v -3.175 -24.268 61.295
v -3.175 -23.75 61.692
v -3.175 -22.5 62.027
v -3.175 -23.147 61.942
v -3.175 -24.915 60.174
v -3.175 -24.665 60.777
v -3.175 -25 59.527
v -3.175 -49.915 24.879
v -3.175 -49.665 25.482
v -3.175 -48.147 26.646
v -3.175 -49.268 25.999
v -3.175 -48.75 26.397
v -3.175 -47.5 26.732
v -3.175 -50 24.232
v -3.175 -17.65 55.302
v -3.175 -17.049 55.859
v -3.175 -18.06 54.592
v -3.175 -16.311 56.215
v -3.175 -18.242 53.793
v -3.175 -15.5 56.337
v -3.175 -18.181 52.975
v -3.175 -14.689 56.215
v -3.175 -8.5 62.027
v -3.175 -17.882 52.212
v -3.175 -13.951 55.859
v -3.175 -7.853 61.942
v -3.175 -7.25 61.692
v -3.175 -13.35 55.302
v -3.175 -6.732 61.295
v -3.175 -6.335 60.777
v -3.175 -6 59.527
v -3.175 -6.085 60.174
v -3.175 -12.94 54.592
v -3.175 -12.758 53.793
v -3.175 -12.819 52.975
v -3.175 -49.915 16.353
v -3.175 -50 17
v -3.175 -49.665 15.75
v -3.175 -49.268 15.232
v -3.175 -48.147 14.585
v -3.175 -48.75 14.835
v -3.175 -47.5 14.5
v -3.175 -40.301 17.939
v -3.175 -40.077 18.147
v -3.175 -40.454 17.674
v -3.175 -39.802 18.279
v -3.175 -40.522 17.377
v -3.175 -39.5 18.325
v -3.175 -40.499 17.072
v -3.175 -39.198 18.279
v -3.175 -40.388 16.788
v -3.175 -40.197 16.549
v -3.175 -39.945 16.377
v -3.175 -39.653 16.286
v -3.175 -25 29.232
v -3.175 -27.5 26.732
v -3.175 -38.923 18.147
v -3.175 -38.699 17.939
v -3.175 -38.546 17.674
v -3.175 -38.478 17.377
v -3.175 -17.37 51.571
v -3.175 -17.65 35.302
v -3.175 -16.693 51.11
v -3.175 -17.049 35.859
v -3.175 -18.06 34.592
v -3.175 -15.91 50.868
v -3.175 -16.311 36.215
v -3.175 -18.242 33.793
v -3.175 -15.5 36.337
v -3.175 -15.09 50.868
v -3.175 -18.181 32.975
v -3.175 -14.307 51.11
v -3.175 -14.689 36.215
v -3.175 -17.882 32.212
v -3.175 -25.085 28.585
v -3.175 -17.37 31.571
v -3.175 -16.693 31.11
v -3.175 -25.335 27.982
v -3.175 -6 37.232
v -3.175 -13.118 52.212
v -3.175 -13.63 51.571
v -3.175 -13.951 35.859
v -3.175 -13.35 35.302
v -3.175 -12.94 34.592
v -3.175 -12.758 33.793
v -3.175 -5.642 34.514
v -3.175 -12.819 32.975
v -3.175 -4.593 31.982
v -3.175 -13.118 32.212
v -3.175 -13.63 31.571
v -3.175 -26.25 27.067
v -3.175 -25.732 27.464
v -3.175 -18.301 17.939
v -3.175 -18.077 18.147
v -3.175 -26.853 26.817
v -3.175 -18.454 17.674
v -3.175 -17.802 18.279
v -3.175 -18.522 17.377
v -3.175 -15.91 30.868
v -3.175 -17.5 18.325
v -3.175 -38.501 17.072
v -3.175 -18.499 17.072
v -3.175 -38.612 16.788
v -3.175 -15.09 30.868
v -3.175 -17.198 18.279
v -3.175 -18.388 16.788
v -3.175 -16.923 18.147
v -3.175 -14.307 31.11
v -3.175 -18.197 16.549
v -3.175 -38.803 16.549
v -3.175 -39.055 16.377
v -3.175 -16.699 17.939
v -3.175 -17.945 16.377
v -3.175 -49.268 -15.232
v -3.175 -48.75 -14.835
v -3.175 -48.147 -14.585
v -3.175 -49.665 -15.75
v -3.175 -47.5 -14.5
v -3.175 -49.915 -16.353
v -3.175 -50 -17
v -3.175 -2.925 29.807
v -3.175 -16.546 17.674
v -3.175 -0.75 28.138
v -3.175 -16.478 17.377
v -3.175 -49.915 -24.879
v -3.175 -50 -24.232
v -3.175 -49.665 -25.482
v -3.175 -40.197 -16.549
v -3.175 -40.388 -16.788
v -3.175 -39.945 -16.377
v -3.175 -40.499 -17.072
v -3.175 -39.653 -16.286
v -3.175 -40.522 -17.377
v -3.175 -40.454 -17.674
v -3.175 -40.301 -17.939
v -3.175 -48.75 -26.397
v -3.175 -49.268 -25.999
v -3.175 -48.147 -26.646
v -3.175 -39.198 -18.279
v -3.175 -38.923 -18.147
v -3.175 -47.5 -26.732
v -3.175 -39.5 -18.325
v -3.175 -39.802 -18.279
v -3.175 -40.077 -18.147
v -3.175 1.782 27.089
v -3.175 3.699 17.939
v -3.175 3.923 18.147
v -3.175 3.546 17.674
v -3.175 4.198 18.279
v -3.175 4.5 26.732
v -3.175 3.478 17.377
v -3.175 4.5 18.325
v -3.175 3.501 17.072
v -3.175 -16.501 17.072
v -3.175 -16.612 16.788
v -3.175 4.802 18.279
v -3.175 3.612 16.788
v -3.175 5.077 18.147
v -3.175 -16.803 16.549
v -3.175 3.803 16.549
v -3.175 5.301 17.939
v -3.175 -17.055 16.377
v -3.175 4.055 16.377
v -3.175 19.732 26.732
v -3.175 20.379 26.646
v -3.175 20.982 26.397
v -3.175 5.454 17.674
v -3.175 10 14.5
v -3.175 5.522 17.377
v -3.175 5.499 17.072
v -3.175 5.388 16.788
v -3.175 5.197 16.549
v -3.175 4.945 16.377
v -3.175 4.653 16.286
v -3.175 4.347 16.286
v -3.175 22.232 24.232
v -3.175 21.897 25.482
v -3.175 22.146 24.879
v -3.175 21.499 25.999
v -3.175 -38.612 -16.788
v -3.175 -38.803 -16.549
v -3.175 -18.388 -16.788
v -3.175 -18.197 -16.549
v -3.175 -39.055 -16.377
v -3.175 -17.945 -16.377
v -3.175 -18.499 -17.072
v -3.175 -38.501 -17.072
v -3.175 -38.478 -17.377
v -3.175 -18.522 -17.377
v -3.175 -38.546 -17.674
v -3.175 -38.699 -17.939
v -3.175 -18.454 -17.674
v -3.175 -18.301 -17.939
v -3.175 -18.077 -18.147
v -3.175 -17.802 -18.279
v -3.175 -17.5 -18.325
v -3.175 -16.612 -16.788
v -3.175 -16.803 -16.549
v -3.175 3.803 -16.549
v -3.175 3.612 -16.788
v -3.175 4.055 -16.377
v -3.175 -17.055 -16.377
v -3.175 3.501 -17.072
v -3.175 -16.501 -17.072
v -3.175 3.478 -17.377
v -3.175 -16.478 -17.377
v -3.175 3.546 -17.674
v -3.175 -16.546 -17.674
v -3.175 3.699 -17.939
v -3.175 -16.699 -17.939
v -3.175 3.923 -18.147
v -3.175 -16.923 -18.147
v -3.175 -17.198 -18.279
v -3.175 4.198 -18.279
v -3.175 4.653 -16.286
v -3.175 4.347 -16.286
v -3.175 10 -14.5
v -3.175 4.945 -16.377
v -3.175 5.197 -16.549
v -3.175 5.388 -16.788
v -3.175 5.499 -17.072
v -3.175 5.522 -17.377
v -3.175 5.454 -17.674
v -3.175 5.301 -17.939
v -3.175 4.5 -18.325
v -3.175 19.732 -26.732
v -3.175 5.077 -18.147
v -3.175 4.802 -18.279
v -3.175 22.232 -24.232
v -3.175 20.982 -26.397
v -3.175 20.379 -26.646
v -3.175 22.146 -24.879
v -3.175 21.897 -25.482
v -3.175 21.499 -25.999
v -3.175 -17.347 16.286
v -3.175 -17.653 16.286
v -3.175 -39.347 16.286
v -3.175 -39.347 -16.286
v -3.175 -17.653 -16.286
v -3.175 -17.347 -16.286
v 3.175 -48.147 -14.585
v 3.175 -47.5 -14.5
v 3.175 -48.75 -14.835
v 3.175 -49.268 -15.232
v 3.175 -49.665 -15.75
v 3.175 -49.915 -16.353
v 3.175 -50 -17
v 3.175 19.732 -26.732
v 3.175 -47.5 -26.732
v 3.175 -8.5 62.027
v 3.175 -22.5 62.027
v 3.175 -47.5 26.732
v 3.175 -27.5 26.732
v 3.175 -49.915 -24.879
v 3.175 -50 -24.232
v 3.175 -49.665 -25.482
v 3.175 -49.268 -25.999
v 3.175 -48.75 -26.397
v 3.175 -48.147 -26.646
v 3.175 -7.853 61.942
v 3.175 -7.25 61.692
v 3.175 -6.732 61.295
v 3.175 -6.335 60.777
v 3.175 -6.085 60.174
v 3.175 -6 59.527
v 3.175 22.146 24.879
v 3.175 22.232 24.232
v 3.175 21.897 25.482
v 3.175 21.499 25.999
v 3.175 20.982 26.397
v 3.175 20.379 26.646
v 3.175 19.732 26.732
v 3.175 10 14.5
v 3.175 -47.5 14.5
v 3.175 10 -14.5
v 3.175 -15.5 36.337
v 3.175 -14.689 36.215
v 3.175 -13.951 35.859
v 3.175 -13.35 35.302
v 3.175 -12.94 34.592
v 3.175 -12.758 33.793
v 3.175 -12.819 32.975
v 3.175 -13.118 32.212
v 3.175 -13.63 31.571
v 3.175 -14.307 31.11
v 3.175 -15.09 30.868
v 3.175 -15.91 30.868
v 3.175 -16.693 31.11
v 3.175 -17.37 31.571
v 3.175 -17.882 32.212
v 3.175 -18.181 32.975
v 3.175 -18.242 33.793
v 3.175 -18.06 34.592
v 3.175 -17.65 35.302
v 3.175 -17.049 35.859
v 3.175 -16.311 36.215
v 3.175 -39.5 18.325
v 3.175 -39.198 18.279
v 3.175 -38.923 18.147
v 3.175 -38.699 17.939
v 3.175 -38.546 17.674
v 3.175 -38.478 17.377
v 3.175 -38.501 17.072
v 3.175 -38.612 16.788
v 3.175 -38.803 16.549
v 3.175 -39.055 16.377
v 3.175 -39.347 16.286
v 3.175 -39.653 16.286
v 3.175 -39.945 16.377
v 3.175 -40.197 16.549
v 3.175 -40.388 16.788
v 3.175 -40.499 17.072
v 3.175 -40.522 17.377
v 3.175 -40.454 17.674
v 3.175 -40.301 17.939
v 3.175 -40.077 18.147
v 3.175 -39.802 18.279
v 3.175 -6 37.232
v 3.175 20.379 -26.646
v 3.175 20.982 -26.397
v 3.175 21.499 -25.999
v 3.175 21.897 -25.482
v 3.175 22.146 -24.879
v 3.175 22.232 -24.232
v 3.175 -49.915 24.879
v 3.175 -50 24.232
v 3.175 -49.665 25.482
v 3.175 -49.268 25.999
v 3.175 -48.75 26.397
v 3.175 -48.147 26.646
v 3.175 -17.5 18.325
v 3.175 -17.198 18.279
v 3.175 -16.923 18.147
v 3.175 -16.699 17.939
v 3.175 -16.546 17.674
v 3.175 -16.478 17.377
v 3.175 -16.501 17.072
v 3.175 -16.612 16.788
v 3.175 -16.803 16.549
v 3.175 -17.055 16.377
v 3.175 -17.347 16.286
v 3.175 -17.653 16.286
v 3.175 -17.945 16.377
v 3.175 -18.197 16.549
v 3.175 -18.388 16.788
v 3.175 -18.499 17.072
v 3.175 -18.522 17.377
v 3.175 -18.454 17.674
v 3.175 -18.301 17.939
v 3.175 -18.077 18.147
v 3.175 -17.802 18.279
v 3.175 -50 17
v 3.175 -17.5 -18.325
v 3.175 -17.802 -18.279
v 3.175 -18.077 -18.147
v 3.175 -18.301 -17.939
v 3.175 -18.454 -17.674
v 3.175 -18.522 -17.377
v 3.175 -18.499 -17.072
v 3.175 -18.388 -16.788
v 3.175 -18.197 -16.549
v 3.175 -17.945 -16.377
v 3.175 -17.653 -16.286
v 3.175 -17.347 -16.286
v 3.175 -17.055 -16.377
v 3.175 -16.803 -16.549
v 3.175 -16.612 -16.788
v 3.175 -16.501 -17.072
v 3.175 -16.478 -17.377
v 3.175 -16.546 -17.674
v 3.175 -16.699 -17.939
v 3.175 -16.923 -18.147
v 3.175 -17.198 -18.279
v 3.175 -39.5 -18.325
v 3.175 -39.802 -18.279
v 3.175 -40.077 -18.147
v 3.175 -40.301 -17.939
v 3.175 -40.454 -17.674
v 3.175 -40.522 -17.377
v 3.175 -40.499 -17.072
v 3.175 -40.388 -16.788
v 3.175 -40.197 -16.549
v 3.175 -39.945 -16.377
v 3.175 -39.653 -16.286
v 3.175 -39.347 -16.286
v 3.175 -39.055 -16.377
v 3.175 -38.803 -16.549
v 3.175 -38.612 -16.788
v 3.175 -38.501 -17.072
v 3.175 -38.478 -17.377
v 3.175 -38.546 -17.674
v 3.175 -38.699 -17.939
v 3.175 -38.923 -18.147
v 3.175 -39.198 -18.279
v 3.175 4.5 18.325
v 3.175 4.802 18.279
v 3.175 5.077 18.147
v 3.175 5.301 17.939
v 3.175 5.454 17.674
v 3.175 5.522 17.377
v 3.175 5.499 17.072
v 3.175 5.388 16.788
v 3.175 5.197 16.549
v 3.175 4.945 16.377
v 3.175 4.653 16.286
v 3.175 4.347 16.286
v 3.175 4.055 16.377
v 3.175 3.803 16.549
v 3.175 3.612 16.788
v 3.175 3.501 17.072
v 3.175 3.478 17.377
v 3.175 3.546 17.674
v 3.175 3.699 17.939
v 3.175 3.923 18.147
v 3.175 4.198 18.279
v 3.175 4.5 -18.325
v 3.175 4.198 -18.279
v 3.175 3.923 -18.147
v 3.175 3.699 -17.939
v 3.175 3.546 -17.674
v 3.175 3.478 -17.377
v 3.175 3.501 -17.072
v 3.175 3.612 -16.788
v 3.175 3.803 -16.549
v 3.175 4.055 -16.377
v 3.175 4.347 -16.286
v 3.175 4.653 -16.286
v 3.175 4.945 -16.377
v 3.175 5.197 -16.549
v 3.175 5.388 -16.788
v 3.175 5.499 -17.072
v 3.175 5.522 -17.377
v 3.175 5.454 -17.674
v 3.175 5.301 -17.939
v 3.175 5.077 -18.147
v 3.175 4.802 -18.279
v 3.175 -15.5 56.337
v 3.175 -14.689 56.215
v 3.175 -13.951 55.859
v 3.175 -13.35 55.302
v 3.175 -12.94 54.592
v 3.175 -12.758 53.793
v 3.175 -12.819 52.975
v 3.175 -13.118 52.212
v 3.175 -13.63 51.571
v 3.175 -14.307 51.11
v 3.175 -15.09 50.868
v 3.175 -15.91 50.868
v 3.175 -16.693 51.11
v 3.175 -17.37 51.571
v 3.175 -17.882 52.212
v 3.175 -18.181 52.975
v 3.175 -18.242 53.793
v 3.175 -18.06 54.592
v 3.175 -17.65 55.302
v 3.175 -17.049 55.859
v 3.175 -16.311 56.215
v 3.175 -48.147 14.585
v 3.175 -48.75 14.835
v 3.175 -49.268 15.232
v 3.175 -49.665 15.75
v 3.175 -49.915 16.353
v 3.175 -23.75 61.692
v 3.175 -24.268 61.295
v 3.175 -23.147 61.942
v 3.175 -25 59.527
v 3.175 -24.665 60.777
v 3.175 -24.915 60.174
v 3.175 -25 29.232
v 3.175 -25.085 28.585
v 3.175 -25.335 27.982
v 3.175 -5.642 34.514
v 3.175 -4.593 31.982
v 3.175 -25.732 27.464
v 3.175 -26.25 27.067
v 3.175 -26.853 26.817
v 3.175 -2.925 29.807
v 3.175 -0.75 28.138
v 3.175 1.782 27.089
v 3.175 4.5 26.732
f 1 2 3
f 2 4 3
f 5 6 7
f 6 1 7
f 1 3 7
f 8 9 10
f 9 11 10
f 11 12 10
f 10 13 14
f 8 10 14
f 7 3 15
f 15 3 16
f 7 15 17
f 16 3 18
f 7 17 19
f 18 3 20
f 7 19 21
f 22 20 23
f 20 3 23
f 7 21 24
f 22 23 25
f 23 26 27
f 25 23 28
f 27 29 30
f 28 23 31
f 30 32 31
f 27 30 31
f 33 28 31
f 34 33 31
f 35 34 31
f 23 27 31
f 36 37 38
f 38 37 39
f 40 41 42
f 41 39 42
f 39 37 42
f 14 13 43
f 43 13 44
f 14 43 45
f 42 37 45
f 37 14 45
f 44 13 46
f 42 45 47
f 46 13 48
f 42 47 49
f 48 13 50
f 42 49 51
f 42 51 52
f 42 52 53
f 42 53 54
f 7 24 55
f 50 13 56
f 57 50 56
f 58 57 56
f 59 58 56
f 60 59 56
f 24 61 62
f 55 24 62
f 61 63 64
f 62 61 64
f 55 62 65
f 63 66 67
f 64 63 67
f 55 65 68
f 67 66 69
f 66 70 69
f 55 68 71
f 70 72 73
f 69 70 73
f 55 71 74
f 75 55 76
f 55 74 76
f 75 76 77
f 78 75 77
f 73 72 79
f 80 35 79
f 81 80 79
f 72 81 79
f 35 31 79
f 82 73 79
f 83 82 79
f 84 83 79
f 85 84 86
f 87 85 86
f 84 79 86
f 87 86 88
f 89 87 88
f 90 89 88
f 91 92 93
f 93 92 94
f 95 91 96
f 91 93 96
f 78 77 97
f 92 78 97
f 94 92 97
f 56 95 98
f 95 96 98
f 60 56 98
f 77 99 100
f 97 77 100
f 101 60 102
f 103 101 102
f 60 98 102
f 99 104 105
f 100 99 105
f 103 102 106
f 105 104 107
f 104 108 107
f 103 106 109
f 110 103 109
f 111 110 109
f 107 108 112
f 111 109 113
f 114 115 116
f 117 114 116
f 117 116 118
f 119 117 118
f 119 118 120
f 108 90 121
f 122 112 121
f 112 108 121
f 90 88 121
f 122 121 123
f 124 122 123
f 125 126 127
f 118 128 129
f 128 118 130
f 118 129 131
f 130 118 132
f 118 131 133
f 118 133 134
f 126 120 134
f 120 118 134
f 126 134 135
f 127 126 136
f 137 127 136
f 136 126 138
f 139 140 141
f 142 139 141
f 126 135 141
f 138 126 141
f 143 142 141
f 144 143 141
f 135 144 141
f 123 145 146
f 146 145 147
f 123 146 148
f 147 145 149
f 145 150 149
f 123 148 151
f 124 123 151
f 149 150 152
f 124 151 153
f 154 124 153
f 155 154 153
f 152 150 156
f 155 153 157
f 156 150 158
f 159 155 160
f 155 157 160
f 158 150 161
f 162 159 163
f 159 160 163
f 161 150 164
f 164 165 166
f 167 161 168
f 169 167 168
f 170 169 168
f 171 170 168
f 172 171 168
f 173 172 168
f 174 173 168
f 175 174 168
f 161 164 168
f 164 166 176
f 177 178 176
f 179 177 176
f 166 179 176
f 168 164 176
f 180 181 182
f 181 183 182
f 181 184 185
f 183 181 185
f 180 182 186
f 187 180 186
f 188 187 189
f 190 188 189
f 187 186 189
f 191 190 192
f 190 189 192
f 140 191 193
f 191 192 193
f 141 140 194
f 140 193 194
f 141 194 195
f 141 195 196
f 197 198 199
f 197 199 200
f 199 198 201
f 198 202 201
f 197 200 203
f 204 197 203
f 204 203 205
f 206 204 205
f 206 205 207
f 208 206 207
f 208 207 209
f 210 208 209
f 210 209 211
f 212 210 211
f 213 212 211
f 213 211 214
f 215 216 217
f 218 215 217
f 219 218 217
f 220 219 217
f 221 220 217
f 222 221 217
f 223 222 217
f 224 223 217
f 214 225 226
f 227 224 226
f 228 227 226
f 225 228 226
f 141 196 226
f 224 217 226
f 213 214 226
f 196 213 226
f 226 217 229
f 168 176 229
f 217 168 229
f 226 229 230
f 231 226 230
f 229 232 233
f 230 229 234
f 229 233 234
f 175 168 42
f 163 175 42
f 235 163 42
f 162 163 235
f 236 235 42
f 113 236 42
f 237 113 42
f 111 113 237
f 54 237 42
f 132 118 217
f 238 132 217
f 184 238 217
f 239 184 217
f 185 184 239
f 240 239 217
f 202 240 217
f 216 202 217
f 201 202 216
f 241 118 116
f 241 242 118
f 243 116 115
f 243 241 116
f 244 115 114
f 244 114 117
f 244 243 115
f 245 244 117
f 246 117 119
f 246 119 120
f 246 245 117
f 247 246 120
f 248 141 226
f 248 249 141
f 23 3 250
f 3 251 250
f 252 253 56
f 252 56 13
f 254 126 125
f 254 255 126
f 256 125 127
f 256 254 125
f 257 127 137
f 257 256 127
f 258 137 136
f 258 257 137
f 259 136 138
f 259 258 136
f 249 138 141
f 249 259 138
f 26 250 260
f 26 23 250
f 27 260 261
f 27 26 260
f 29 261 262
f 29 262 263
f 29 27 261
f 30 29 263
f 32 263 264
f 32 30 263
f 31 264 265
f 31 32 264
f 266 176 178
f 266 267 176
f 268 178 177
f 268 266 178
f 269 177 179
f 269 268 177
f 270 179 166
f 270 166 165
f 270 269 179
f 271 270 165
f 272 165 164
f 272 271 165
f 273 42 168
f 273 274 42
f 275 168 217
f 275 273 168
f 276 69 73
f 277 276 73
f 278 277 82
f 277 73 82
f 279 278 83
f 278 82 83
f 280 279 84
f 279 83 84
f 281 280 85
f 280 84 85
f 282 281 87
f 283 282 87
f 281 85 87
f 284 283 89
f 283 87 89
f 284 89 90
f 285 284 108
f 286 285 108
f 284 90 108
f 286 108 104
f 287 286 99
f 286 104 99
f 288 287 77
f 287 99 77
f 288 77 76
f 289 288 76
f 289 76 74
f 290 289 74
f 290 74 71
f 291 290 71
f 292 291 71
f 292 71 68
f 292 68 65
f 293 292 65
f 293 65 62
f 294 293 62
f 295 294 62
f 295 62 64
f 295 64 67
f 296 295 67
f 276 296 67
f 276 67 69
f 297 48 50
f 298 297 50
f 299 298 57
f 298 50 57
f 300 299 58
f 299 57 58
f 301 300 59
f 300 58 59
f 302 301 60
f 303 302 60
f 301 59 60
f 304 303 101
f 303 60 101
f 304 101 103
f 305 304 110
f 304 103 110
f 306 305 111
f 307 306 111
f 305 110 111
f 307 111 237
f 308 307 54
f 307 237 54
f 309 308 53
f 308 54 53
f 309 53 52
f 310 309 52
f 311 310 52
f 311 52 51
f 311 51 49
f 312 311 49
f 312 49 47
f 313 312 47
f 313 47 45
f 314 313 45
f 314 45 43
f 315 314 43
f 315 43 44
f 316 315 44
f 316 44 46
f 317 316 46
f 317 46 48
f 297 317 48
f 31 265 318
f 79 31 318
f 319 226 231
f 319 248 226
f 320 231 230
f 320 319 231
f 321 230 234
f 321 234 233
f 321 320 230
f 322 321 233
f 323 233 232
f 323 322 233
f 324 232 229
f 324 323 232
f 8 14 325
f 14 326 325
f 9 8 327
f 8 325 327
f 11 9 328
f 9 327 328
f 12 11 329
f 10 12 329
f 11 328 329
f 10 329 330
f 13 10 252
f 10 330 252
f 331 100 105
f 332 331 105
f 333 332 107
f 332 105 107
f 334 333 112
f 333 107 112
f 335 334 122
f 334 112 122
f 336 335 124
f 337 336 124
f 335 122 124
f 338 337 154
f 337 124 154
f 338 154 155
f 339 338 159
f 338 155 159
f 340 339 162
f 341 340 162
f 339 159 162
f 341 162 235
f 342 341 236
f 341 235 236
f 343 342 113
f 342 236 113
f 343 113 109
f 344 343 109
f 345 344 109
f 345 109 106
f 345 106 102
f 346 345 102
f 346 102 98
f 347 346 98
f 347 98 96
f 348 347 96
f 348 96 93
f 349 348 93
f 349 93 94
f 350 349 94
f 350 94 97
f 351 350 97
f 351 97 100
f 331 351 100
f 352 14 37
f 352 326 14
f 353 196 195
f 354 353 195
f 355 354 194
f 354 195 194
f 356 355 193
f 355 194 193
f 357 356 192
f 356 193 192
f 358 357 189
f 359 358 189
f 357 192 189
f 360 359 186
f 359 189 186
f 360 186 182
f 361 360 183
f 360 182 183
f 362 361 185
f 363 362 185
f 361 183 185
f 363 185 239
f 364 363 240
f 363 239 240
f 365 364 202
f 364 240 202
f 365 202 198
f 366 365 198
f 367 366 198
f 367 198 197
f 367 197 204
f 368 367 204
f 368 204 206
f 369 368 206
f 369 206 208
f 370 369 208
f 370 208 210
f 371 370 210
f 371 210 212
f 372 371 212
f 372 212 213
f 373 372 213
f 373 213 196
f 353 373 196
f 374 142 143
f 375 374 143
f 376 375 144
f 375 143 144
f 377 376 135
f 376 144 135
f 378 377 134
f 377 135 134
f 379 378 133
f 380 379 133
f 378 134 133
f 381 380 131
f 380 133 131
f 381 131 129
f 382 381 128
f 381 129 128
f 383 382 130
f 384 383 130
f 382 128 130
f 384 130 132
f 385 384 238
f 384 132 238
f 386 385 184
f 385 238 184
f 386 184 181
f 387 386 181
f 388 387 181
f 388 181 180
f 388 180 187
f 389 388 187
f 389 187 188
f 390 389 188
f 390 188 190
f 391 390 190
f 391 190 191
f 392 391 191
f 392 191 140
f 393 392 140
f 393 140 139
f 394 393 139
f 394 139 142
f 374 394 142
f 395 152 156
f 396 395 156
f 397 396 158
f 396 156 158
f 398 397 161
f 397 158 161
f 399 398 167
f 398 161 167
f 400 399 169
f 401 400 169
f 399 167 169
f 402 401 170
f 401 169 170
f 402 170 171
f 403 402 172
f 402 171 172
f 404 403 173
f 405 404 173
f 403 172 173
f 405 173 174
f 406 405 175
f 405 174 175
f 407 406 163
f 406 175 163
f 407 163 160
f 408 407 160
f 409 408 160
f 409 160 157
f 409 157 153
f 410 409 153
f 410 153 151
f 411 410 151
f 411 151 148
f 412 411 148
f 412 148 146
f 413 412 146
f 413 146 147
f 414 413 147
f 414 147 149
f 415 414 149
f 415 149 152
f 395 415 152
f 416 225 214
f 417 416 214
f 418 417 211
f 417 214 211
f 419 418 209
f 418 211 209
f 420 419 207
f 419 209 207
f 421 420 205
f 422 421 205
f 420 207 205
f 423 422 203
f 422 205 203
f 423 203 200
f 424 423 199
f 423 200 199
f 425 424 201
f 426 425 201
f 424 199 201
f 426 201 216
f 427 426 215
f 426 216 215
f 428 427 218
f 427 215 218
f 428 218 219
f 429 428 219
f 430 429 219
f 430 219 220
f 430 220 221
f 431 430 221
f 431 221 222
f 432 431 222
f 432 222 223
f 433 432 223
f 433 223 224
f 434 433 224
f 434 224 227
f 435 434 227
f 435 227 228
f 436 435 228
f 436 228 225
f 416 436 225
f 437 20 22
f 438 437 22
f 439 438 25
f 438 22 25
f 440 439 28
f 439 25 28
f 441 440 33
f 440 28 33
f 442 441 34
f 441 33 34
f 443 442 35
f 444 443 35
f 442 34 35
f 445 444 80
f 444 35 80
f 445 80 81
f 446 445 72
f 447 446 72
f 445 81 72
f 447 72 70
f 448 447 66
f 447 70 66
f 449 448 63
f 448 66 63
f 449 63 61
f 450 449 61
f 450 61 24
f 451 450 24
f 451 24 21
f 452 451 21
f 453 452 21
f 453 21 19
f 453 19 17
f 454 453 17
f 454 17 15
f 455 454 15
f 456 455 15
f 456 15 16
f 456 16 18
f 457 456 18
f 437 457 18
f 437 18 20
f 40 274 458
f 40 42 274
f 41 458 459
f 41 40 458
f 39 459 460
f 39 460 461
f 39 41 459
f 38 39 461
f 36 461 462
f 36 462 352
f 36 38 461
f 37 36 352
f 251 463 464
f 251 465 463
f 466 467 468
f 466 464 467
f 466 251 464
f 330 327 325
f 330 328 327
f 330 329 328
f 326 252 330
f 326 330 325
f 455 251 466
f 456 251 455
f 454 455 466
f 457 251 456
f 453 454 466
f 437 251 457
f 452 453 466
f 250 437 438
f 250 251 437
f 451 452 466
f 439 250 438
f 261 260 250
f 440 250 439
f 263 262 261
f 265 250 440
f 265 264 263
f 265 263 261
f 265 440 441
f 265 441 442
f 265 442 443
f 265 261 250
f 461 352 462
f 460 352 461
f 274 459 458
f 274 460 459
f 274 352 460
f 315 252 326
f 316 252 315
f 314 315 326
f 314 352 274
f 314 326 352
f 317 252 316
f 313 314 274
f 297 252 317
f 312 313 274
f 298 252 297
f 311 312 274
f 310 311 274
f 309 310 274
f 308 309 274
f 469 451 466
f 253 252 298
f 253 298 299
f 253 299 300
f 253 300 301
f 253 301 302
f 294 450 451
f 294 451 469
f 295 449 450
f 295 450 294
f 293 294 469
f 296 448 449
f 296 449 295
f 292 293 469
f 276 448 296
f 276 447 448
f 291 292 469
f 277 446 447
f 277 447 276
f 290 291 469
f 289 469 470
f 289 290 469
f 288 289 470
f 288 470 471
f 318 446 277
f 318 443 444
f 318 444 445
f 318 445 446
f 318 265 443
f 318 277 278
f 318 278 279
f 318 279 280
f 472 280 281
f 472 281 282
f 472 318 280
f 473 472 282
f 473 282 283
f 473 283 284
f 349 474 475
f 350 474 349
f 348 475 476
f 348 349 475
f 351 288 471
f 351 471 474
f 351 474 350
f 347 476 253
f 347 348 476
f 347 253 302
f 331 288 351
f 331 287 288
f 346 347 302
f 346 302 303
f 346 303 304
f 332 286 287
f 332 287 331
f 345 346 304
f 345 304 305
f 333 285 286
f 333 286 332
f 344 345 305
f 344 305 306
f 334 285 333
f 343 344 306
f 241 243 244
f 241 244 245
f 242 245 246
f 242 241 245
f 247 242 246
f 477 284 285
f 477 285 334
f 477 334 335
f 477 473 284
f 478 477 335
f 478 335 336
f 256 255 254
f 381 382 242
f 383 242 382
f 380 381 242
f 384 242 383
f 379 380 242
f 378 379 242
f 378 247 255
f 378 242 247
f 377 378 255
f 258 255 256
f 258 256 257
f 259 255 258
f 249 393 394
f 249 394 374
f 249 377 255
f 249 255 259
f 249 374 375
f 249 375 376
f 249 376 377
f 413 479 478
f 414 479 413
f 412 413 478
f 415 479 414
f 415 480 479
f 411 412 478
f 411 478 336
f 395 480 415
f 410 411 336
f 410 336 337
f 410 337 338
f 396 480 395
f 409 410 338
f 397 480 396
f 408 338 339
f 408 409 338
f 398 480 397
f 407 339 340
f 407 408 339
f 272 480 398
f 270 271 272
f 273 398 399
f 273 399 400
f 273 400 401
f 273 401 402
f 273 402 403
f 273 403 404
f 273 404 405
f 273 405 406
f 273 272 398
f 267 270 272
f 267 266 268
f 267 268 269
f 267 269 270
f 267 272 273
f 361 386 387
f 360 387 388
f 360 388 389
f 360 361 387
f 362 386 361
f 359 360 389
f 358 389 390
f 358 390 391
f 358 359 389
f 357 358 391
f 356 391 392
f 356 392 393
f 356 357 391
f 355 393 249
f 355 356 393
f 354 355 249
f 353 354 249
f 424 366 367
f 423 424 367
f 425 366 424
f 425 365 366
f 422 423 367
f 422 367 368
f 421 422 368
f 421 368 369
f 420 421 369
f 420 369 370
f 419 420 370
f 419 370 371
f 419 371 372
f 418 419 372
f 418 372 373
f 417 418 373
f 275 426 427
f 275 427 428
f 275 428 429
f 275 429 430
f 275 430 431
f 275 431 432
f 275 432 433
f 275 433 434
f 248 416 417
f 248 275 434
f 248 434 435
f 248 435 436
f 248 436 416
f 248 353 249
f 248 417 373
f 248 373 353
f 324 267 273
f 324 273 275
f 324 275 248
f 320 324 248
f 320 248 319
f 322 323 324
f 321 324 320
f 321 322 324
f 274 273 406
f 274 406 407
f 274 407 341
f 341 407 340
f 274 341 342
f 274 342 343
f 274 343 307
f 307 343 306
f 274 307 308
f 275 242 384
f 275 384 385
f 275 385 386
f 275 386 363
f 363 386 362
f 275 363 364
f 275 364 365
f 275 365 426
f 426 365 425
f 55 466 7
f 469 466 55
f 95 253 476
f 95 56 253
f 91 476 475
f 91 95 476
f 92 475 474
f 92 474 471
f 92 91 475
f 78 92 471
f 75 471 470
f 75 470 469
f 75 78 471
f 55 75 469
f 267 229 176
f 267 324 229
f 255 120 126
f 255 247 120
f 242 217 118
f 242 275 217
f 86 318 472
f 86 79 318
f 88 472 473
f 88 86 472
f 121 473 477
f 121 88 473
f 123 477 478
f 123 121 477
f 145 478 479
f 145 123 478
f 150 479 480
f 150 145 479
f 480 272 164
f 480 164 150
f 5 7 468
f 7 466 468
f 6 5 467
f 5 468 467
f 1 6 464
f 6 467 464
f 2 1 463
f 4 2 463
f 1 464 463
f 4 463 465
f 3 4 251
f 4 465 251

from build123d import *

# Parameters (mm, degrees)
SKETCH11_W           = 36.88
SKETCH11_H           = 19
BOSS_EXTRUDE3_DEPTH  = 3.175
BOSS_EXTRUDE2_DEPTH  = 3.175
SKETCH4_R            = 1.025
CUT_EXTRUDE4_DEPTH   = 80.923101916
M5_CLEARANCE_HOLE1_D = 5.5
FILLET1_R            = 2.5
FILLET2_R            = 10.5


with BuildPart() as part:
    # Sketch11 → Boss-Extrude3 (new, symmetric)
    with BuildSketch(Plane(origin=(0, 0, 0), x_dir=(0, 0, -1), z_dir=(1, 0, 0))):
        with Locations((-43.587249817, -15.5)):
            Rectangle(SKETCH11_W, SKETCH11_H)
    extrude(amount=BOSS_EXTRUDE3_DEPTH, both=True)

    # Sketch8 → Boss-Extrude2 (add, symmetric)
    with BuildSketch(Plane(origin=(0, 0, 0), x_dir=(0, 0, -1), z_dir=(1, 0, 0))):
        Polygon((14.5, 10), (14.5, -50), (26.73162128, -50), (26.73162128, 22.23162128), (-26.73162128, 22.23162128), (-26.73162128, -50), (-14.5, -50), (-14.5, 10), align=None)
    extrude(amount=BOSS_EXTRUDE2_DEPTH, both=True)

    # Sketch4 → Cut-Extrude4 (cut, through all)
    with BuildSketch(Plane.ZY.offset(3.175)):
        with Locations((17.3, -39.5)):
            Circle(SKETCH4_R)
        with Locations(Location((-17.3, -39.5, 0), (0, 0, 180))):
            Circle(SKETCH4_R)
        with Locations((17.3, -17.5)):
            Circle(SKETCH4_R)
        with Locations(Location((-17.3, -17.5, 0), (0, 0, 180))):
            Circle(SKETCH4_R)
        with Locations(Location((-17.3, 4.5, 0), (0, 0, 180))):
            Circle(SKETCH4_R)
        with Locations((17.3, 4.5)):
            Circle(SKETCH4_R)
    extrude(amount=-CUT_EXTRUDE4_DEPTH, mode=Mode.SUBTRACT)

    # M5 Clearance Hole1 (through all)
    with Locations(Plane(origin=(3.175, 0, 0), x_dir=(0, 0, -1), z_dir=(1, 0, 0))):
        with Locations((-53.587249817, -15.5), (-33.587249817, -15.5)):
            Hole(M5_CLEARANCE_HOLE1_D / 2)

    # Fillet1
    fillet1_edges = [part.edges().sort_by_distance(p)[0] for p in [
        (0, -25, 26.73162128),
        (0, 22.23162128, 26.73162128),
        (0, -50, -14.5),
        (0, -50, -26.73162128),
        (0, 22.23162128, -26.73162128),
        (0, -50, 26.73162128),
        (0, -50, 14.5),
        (0, -25, 62.027249817),
        (0, -6, 62.027249817),
    ]]
    fillet(fillet1_edges, radius=FILLET1_R)

    # Fillet2
    fillet2_edges = [part.edges().sort_by_distance(p)[0] for p in [
        (0, -6, 26.73162128),
    ]]
    fillet(fillet2_edges, radius=FILLET2_R)


solid = part.part
